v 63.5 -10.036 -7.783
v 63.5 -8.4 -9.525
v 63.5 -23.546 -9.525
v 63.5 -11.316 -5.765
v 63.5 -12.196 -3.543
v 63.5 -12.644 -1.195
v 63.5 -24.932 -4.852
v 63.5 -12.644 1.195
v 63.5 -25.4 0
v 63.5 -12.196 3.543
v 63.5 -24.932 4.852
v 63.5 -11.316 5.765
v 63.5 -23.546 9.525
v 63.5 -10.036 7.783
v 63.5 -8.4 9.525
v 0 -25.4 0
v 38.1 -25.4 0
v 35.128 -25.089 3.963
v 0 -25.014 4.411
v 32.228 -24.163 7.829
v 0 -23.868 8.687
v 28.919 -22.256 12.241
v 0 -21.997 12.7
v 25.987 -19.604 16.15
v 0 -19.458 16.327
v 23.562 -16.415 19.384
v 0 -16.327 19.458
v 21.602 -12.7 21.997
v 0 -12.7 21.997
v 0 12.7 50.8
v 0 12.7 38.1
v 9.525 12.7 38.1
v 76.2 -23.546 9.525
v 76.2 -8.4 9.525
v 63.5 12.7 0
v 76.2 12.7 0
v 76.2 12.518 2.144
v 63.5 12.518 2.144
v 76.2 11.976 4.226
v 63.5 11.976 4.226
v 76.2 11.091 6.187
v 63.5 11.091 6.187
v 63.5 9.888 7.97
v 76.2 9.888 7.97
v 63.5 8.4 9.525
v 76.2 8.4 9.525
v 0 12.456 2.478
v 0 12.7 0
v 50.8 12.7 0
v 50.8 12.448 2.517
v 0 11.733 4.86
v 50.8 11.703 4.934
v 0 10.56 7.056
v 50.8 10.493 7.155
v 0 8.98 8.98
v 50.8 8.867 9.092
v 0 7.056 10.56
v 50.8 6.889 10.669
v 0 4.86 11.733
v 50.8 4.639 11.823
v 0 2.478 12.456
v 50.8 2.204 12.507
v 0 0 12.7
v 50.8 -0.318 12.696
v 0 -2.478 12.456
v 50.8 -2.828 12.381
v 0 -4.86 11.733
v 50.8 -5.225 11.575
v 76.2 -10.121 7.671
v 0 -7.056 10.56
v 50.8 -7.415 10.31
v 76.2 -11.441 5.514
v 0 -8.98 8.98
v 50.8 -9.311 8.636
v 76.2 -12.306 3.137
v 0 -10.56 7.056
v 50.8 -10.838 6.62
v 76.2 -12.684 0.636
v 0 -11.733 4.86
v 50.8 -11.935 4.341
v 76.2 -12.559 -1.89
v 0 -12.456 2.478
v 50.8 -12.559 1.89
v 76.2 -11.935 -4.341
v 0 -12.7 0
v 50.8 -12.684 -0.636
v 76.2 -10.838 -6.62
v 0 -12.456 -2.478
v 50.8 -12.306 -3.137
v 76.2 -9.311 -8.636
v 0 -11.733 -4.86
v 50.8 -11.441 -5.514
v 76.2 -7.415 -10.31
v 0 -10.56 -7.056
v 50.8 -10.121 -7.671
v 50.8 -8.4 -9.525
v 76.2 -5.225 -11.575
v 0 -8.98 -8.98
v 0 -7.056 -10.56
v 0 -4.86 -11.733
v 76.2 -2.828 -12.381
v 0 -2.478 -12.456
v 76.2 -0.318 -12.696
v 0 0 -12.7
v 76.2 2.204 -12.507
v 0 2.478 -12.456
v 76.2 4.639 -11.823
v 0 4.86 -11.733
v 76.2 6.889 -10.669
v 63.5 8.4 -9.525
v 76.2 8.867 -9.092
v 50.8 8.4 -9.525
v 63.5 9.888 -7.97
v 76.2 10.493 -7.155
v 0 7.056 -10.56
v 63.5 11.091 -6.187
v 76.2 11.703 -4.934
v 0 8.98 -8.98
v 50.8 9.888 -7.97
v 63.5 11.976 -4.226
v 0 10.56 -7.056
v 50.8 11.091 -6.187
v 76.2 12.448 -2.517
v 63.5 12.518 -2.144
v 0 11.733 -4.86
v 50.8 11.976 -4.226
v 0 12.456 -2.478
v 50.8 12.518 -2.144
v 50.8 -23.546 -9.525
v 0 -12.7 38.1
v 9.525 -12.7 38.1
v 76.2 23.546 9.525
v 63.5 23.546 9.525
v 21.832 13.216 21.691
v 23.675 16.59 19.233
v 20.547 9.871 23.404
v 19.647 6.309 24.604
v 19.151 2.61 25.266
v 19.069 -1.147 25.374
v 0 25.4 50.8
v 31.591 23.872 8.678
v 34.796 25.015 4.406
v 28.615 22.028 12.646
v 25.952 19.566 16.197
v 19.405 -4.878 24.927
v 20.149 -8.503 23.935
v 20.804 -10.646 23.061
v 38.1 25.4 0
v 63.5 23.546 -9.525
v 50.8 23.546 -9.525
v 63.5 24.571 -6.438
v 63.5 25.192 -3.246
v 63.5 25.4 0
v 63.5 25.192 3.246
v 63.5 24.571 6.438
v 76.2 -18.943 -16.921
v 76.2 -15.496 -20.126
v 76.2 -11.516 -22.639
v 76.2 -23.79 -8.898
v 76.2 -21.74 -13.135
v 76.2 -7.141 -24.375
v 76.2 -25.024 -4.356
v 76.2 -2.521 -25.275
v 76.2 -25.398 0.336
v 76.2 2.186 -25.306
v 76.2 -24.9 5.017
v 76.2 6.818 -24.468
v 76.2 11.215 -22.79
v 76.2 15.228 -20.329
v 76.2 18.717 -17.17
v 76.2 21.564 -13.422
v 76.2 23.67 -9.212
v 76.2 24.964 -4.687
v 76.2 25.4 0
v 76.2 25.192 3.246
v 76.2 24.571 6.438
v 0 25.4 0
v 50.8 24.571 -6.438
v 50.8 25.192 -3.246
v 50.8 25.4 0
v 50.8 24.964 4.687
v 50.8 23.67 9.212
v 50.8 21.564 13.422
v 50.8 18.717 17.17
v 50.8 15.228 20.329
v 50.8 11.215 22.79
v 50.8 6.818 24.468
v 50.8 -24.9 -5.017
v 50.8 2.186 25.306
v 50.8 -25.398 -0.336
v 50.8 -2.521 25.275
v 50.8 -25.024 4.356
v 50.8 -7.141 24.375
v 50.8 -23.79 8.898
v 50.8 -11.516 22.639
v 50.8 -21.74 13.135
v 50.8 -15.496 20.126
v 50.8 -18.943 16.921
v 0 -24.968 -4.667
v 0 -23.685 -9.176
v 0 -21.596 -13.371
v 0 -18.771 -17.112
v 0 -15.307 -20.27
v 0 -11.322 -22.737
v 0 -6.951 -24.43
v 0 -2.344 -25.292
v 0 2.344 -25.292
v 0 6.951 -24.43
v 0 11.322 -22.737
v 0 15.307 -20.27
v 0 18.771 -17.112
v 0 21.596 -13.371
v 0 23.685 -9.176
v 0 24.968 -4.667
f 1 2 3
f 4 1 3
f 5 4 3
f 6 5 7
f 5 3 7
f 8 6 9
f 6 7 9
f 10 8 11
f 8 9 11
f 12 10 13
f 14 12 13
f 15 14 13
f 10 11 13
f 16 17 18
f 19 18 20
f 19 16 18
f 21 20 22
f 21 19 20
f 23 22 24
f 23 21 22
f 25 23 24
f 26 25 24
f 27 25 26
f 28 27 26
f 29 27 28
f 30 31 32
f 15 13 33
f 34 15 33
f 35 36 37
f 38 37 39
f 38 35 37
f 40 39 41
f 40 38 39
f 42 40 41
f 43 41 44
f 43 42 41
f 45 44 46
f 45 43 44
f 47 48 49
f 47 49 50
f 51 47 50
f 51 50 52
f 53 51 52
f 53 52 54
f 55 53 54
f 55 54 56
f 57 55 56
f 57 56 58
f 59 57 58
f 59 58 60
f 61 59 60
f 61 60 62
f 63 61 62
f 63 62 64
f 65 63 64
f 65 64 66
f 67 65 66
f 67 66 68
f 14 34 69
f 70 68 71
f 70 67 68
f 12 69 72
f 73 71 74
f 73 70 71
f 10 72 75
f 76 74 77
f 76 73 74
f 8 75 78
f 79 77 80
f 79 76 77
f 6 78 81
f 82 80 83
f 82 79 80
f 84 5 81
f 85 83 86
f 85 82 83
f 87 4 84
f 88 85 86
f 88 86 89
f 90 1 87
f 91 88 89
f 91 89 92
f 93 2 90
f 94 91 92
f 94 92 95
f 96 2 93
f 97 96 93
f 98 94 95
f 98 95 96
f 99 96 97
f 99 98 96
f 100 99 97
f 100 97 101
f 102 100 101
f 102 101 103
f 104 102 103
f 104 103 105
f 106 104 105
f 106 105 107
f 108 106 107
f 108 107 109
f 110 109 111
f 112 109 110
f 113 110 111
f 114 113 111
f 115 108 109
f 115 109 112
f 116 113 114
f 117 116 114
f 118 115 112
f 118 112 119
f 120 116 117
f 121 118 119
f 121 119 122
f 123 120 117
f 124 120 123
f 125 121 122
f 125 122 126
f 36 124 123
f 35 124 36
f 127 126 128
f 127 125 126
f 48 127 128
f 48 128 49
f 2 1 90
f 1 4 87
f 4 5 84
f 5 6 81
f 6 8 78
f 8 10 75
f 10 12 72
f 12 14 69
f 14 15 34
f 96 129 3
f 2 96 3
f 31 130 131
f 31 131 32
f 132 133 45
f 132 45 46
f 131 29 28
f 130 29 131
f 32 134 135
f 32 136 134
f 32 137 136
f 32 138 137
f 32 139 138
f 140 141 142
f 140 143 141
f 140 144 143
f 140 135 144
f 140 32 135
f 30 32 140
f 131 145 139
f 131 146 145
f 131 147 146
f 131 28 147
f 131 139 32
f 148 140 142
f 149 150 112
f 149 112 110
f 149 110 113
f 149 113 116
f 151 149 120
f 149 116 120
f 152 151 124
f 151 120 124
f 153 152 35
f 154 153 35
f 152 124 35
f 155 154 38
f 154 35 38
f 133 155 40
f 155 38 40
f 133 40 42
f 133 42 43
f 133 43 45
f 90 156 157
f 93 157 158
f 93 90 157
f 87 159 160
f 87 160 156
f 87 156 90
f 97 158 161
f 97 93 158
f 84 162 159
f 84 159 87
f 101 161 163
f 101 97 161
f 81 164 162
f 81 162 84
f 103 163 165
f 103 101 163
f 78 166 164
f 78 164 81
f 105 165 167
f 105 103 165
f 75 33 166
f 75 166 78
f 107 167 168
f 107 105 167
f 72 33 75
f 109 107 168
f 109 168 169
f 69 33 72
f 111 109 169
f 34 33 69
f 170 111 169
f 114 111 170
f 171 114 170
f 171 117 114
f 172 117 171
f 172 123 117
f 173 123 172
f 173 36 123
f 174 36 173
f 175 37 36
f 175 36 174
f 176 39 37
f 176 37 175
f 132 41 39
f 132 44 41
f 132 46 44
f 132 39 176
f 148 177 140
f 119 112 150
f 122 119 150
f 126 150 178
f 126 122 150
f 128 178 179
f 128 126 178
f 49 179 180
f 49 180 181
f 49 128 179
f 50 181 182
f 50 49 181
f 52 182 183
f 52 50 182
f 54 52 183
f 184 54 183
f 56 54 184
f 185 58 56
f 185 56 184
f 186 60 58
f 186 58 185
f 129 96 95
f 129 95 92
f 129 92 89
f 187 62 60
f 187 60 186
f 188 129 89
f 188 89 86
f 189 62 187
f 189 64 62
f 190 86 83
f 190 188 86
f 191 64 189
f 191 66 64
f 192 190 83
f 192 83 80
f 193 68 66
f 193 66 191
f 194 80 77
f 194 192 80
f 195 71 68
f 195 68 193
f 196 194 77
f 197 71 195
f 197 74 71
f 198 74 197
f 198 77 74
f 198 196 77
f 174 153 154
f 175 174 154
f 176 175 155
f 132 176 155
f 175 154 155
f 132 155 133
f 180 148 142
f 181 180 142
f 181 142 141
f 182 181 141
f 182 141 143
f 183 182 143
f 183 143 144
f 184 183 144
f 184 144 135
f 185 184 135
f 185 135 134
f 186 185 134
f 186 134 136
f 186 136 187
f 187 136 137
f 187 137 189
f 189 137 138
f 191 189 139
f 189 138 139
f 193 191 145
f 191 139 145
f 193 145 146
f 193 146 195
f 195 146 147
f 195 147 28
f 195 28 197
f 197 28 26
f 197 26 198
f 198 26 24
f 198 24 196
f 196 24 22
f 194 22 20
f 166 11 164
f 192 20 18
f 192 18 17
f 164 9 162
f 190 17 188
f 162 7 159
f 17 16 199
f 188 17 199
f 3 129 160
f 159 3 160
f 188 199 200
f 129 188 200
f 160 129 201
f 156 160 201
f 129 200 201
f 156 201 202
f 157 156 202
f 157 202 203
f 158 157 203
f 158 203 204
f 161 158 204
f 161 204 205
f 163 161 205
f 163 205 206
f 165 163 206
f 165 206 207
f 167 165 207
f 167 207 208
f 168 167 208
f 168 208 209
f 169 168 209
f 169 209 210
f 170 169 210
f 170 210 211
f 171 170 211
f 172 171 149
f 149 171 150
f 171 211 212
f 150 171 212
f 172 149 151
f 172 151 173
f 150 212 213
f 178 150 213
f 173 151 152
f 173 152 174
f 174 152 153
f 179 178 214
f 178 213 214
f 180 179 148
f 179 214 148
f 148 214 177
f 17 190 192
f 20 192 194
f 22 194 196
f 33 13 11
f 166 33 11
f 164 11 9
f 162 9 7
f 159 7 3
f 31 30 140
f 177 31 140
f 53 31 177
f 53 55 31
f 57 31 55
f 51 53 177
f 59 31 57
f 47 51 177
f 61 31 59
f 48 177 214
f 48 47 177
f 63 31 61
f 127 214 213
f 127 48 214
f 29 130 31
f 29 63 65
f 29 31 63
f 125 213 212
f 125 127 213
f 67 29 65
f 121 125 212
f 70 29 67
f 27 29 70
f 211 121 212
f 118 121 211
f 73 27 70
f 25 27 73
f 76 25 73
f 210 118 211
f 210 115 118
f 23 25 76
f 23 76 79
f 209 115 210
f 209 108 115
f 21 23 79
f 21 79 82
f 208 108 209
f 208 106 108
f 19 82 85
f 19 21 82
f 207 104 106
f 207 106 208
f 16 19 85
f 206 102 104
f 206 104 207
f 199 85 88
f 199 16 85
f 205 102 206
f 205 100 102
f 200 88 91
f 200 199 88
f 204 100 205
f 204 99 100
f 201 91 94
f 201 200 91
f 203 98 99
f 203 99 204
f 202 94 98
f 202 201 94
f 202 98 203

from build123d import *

# Parameters (mm, degrees)
F4_DEPTH  = 25.4
F5_DEPTH  = 50.8
F0_R      = 25.4
F0_R_2    = 12.7
F6_DEPTH  = 76.2
F7_DEPTH  = 76.2
F1_W      = 12.7
F1_H      = 34.925
F8_DEPTH  = 25.4
F9_W      = 12.7
F9_H      = 15.875
F10_DEPTH = 25.4


with BuildPart() as f4:
    # F2 (on Front) → F4 (new body, symmetric)
    with BuildSketch(Plane.XZ):
        Polygon((0, 50.8), (0, 0), (38.1, 0), align=None)
    extrude(amount=F4_DEPTH, both=True)

    # F3 (on Right) → F5 (cut)
    with BuildSketch(Plane.YZ):
        with BuildLine():
            ThreePointArc((-25.4, 0), (-21.997045, 12.7), (-12.7, 21.997045))
            Line((-12.7, 21.997045), (-12.7, 38.1))
            Line((-12.7, 38.1), (12.7, 38.1))
            Line((12.7, 38.1), (12.7, 50.8))
            Line((12.7, 50.8), (-25.4, 50.8))
            Line((-25.4, 50.8), (-25.4, 0))
        make_face()
    extrude(amount=F5_DEPTH, mode=Mode.SUBTRACT)

    # F0 (on Right) → F6 (join)
    with BuildSketch(Plane.YZ):
        Circle(F0_R)
        Circle(F0_R_2, mode=Mode.SUBTRACT)
    extrude(amount=F6_DEPTH)

    # F0 (on Right) → F7 (cut)
    with BuildSketch(Plane.YZ):
        Circle(F0_R_2)
    extrude(amount=F7_DEPTH, mode=Mode.SUBTRACT)

    # F1 (on Front) → F8 (cut, symmetric)
    with BuildSketch(Plane.XZ):
        with Locations((57.15, 7.9375)):
            Rectangle(F1_W, F1_H)
    extrude(amount=F8_DEPTH, both=True, mode=Mode.SUBTRACT)

    # F9 (on Front) → F10 (cut, symmetric)
    with BuildSketch(Plane.XZ):
        with Locations((69.85, 17.4625)):
            Rectangle(F9_W, F9_H)
    extrude(amount=F10_DEPTH, both=True, mode=Mode.SUBTRACT)


solid = f4.part
